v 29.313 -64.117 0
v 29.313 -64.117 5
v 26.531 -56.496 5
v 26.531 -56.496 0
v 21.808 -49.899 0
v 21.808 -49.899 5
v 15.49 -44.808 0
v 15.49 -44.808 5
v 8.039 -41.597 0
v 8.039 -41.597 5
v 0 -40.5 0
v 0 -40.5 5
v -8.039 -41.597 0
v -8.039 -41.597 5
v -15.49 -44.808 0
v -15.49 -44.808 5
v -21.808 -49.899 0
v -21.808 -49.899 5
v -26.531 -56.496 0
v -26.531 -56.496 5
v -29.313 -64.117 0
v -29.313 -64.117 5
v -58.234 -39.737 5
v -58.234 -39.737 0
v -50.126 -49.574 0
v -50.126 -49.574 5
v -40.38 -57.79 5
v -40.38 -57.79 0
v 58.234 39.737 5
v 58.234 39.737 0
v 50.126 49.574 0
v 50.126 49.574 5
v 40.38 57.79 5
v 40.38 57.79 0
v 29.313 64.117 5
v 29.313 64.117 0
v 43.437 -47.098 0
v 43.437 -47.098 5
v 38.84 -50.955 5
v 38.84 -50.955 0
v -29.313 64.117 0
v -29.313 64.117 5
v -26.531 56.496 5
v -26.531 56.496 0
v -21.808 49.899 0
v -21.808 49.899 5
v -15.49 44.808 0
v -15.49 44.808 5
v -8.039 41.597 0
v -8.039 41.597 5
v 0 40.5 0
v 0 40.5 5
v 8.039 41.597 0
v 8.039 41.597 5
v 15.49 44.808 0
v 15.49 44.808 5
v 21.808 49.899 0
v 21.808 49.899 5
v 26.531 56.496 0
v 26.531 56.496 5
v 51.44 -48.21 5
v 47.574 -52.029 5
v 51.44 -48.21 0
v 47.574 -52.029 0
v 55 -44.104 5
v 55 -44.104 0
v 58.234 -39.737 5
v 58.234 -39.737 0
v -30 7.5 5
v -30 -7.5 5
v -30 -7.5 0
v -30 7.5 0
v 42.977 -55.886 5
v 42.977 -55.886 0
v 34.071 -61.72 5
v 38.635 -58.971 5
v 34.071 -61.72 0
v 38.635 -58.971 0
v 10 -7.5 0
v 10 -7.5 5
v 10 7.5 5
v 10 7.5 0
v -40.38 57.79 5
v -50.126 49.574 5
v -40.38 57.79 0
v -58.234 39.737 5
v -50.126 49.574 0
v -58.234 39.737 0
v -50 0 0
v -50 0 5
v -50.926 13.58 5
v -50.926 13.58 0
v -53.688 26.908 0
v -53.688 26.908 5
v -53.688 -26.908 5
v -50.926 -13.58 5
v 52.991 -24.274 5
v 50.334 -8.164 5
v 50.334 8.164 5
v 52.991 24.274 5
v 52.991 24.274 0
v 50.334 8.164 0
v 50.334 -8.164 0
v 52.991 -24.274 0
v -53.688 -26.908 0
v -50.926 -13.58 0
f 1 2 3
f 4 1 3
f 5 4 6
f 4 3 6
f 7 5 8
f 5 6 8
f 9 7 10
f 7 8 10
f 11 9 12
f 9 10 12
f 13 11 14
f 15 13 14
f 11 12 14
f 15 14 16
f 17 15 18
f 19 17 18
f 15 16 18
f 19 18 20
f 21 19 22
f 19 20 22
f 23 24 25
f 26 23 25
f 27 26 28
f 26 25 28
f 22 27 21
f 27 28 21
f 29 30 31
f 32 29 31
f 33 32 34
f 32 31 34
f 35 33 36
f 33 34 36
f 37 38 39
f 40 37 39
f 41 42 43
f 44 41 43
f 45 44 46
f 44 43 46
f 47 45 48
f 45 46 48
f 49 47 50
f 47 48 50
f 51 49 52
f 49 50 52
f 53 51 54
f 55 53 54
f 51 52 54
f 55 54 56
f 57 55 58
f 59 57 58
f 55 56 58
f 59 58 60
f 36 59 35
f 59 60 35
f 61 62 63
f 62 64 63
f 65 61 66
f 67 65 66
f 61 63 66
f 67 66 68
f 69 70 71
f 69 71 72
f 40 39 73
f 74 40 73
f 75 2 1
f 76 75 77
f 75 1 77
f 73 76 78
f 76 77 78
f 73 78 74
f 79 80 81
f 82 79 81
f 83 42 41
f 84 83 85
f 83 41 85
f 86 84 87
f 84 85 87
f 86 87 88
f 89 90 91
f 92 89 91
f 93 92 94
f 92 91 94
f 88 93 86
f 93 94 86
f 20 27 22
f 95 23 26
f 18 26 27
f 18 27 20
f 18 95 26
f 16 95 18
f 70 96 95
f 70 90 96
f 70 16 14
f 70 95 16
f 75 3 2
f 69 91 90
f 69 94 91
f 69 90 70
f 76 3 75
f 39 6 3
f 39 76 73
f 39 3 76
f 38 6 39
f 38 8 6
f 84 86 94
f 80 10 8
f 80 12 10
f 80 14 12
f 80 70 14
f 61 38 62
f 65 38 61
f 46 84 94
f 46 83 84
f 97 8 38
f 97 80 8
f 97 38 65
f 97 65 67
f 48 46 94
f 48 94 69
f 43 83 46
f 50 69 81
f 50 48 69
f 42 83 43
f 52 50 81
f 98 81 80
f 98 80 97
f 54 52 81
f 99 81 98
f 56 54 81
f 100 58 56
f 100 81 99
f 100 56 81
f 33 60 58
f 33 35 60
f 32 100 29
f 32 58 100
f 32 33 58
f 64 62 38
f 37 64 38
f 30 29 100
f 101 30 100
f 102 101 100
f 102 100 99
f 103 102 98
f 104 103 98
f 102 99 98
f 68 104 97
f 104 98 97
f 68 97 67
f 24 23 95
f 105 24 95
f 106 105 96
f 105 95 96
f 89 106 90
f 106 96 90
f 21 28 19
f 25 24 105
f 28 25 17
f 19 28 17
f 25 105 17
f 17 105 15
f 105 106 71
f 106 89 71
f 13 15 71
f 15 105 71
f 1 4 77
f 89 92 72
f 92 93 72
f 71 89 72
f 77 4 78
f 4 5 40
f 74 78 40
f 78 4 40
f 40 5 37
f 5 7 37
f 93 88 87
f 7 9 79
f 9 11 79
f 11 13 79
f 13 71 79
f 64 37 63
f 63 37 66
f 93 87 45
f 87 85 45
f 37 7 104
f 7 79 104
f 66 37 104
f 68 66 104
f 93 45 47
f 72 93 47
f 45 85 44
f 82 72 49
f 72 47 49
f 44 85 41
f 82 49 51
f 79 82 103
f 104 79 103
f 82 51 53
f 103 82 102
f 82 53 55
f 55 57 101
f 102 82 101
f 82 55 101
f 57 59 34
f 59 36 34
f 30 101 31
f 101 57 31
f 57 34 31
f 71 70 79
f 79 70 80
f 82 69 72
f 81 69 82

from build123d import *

# Parameters (mm, degrees)
F0_R     = 70.5
F1_DEPTH = 5
F2_W     = 40
F2_H     = 15
F3_DEPTH = 25
F5_DEPTH = 25
F7_DEPTH = 25


with BuildPart() as f1:
    # F0 (on Top) → F1 (new body)
    with BuildSketch(Plane.XY):
        Circle(F0_R)
    extrude(amount=F1_DEPTH)

    # F2 (on face) → F3 (cut)
    with BuildSketch(Plane.XY.offset(5)):
        with Locations((-10, 0)):
            Rectangle(F2_W, F2_H)
    extrude(amount=-F3_DEPTH, mode=Mode.SUBTRACT)

    # F4 (on face) → F5 (cut)
    with BuildSketch(Plane.XY.offset(5)):
        with BuildLine():
            ThreePointArc((29.3130957529, 64.1170212766), (0, 70.5), (-29.3130957529, 64.1170212766))
            ThreePointArc((-29.3130957529, 64.1170212766), (0, 40.5), (29.3130957529, 64.1170212766))
        make_face()
        with BuildLine():
            ThreePointArc((-50, 0), (-52.0801773558, 20.2905971655), (-58.2341666667, 39.7370335158))
            ThreePointArc((-58.2341666667, 39.7370335158), (-70.5, 0), (-58.2341666667, -39.7370335158))
            ThreePointArc((-58.2341666667, -39.7370335158), (-52.0801773558, -20.2905971655), (-50, 0))
        make_face()
        with BuildLine():
            ThreePointArc((29.3130957529, -64.1170212766), (0, -40.5), (-29.3130957529, -64.1170212766))
            ThreePointArc((-29.3130957529, -64.1170212766), (0, -70.5), (29.3130957529, -64.1170212766))
        make_face()
        with BuildLine():
            ThreePointArc((70.5, 0), (67.363783853, 20.7935236312), (58.2341666667, 39.7370335158))
            ThreePointArc((58.2341666667, 39.7370335158), (50, 0), (58.2341666667, -39.7370335158))
            ThreePointArc((58.2341666667, -39.7370335158), (67.363783853, -20.7935236312), (70.5, 0))
        make_face()
    extrude(amount=-F5_DEPTH, mode=Mode.SUBTRACT)

    # F6 (on face) → F7 (cut)
    with BuildSketch(Plane.XY.offset(5)):
        with BuildLine():
            ThreePointArc((42.9773455668, -55.88557746), (45.3165264829, -54.0061332399), (47.5736122255, -52.0288518018))
            Line((47.5736122255, -52.0288518018), (43.4365403493, -47.0984815306))
            Line((43.4365403493, -47.0984815306), (38.8402736906, -50.9552071887))
            Line((38.8402736906, -50.9552071887), (42.9773455668, -55.88557746))
        make_face()
    extrude(amount=-F7_DEPTH, mode=Mode.SUBTRACT)


solid = f1.part
